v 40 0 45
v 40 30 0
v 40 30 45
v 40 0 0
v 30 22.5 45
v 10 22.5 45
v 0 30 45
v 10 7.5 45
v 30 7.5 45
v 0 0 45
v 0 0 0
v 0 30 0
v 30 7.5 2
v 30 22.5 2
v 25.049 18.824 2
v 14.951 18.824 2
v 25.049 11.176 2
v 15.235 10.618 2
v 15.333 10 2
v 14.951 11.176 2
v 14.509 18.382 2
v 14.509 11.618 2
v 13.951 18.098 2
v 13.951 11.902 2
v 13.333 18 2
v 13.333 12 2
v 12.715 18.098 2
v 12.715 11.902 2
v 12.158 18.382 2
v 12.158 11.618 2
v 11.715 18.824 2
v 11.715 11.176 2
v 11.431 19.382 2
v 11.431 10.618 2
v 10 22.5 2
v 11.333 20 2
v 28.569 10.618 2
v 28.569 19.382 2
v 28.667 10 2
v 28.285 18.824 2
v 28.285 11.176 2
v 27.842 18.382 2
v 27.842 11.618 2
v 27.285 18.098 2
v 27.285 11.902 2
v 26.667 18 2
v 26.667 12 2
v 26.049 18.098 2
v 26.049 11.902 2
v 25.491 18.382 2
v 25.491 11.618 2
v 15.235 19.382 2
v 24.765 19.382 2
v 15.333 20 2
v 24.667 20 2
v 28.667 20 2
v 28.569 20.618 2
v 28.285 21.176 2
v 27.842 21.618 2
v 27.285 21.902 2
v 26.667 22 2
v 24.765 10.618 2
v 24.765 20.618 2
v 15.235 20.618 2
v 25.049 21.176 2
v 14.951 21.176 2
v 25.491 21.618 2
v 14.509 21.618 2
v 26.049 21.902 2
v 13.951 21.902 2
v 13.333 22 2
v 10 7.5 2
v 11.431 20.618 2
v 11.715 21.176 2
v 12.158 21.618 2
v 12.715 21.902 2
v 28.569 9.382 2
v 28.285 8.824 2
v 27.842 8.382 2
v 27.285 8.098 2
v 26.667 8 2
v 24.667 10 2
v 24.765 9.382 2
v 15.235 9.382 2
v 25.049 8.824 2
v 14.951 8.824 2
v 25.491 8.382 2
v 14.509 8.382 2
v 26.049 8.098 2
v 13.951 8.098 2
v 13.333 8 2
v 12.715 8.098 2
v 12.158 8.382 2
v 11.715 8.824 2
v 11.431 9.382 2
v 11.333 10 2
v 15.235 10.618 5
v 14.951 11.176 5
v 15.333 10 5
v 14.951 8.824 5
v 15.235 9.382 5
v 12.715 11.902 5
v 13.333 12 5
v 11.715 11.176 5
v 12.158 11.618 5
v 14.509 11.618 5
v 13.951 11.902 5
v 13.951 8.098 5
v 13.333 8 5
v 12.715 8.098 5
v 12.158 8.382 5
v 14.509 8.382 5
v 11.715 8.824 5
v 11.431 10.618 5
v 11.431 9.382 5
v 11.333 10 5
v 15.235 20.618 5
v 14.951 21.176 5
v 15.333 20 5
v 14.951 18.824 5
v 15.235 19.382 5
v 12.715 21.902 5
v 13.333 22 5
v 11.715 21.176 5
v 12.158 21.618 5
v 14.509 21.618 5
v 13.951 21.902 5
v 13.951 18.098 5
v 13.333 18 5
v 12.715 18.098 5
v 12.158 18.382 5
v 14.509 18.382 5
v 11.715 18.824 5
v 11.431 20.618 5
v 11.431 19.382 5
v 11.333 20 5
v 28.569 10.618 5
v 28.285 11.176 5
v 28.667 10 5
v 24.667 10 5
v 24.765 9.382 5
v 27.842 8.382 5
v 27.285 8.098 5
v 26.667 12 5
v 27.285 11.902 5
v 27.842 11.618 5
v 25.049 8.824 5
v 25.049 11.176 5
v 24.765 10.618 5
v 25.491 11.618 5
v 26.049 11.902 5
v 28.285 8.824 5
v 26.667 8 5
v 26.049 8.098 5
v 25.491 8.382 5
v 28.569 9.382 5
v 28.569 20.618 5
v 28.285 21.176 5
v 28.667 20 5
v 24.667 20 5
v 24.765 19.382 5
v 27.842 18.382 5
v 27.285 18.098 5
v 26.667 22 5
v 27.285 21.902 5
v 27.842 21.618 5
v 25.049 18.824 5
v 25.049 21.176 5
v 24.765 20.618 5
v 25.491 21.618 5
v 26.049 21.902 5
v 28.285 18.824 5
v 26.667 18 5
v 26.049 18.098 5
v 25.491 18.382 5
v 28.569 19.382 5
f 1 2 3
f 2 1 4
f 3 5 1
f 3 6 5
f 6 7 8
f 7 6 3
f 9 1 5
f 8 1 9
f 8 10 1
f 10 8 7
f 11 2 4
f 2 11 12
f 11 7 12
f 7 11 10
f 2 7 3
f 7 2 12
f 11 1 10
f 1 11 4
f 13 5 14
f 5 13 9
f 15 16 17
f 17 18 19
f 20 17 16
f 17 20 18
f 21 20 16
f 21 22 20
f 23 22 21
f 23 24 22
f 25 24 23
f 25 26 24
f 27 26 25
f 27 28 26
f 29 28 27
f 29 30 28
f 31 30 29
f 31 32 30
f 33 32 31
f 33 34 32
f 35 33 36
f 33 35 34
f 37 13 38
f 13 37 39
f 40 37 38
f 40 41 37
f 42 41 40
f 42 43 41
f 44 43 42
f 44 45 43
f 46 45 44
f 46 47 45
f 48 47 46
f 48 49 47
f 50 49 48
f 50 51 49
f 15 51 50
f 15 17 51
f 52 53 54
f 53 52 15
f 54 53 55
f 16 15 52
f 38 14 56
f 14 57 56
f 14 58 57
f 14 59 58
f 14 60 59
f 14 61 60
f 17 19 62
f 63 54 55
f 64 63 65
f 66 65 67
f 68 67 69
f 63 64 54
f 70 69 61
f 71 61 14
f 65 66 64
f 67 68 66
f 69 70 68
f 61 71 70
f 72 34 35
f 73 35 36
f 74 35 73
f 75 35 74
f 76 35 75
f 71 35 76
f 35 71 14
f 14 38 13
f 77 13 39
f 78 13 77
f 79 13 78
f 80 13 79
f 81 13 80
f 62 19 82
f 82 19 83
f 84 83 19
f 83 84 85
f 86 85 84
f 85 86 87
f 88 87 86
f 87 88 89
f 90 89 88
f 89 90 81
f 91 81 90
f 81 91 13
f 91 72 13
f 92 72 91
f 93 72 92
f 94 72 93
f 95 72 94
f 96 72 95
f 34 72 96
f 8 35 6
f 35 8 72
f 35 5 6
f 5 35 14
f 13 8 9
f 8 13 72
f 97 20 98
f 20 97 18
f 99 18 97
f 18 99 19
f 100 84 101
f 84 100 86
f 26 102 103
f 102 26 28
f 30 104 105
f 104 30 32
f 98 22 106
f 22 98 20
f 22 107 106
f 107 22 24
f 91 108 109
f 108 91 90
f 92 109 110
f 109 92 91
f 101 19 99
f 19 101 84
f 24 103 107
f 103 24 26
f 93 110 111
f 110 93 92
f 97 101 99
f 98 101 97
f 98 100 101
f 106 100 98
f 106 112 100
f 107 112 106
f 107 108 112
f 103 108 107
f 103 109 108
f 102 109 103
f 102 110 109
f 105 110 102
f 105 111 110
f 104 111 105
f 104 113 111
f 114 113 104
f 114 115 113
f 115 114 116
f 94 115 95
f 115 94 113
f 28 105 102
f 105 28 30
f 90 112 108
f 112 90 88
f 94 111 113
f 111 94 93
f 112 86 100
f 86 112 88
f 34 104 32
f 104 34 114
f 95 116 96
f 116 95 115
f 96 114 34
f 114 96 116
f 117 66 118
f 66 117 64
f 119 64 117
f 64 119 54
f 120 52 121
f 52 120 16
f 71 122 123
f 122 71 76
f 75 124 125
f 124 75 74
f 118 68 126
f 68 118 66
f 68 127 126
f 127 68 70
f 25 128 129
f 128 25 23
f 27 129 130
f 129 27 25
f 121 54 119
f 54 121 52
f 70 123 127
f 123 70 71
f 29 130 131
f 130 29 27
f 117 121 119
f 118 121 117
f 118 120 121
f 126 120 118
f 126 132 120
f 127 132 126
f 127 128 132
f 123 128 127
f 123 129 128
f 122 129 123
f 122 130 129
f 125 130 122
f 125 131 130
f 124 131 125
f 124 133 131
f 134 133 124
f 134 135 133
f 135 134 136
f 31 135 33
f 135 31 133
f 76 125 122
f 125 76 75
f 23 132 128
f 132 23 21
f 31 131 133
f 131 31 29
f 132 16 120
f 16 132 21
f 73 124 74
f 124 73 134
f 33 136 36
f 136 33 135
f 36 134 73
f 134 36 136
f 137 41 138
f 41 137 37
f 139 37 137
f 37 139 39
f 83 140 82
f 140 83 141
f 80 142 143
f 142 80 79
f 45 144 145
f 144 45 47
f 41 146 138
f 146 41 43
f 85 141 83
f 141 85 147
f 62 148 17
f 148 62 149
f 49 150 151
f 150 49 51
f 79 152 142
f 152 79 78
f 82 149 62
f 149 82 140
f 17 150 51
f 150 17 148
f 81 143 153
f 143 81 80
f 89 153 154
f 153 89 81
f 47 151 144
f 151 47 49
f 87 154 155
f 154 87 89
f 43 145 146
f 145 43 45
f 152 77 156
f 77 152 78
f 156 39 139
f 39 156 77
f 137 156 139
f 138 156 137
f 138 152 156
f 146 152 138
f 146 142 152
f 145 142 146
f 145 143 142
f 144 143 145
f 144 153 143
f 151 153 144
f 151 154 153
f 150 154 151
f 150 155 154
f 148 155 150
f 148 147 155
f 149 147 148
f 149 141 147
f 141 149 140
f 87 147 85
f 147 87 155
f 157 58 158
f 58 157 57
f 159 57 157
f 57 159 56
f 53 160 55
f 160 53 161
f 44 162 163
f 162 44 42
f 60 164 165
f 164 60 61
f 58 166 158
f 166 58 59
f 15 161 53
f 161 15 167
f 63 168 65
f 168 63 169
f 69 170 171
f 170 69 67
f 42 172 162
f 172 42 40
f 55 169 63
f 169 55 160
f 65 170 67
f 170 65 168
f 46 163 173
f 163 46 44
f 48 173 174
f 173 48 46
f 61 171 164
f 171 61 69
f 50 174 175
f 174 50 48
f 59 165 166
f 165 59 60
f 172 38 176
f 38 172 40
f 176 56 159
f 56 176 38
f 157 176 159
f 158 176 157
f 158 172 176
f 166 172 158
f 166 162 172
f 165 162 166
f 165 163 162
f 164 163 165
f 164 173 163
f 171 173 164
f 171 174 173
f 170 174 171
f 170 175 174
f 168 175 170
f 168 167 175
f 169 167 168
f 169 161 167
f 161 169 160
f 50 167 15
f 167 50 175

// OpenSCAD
/* 
 * Wrench Holder Generator
 * Holds wrenches in various sizes
 * Compatible with toolgrid-generator.scad peg hole pattern
 */

/* [Display Mode] */
print_mode = "single"; // [single, multi_row]

/* [Grid Integration] */
hole_center_spacing = 9.5; // [8:12]
pin_hole_diameter = 4.2; // [3:8]

/* [Wrench Size] */
wrench_size = "large"; // [small, large]
width_offset = 0; // [-5:5] - Fine-tune width

/* [Housing Dimensions] */
housing_width = 40; // [25:55]
housing_height = 30; // [20:45]
housing_depth = 45; // [30:70]

/* [Pin Configuration] */
pin_diameter = 4.0; // [3:6]
num_pins_x = 2; // [1:4]
num_pins_y = 2; // [1:4]

/* [Rotation] */
holder_rotation = 0; // [0:360]

/* [Wall Thickness] */
wall_thickness = 3; // [2:5]
floor_thickness = 2; // [1:4]

/* [Advanced] */
pin_offset_from_edge = 3; // [1:8]
fillet_radius = 1; // [0:3]

// ===== CALCULATED PARAMETERS =====
final_width = housing_width + width_offset;
pin_spacing_x = final_width / (num_pins_x + 1);
pin_spacing_y = housing_height / (num_pins_y + 1);

// ===== MAIN MODULES =====

module holder_base() {
    difference() {
        cube([final_width, housing_height, housing_depth]);
        
        translate([
            (final_width - 20) / 2,
            (housing_height - 15) / 2,
            floor_thickness
        ]) {
            cube([20, 15, housing_depth]);
        }
        
        for (x = [1:num_pins_x]) {
            for (y = [1:num_pins_y]) {
                pin_x = x * pin_spacing_x;
                pin_y = y * pin_spacing_y;
                translate([pin_x, pin_y, pin_offset_from_edge]) {
                    cylinder(d=pin_diameter, h=housing_depth, $fn=20);
                }
            }
        }
    }
    
    for (x = [1:num_pins_x]) {
        for (y = [1:num_pins_y]) {
            pin_x = x * pin_spacing_x;
            pin_y = y * pin_spacing_y;
            translate([pin_x, pin_y, 0]) {
                cylinder(d=pin_diameter, h=pin_offset_from_edge + pin_diameter/2, $fn=20);
            }
        }
    }
}

module mounting_pegs() {
    peg_diameter = pin_hole_diameter - 0.2;
    peg_height = 5;
    
    translate([pin_diameter/2 + wall_thickness, housing_height/2, 0]) {
        cylinder(d=peg_diameter, h=peg_height, $fn=20);
    }
    translate([final_width - wall_thickness - pin_diameter/2, housing_height/2, 0]) {
        cylinder(d=peg_diameter, h=peg_height, $fn=20);
    }
}

module complete_holder() {
    translate([final_width/2, housing_height/2, 0]) {
        rotate([0, 0, holder_rotation]) {
            translate([-final_width/2, -housing_height/2, 0]) {
                holder_base();
            }
        }
    }
    mounting_pegs();
}

// ===== GENERATION =====

if (print_mode == "single") {
    complete_holder();
} else if (print_mode == "multi_row") {
    spacing = hole_center_spacing * 2.5;
    for (i = [0:3]) {
        translate([i * spacing, 0, 0]) {
            complete_holder();
        }
    }
}

// ===== DEBUG OUTPUT =====
echo("=== Wrench Holder Generator ===");
echo("Size: ", wrench_size);
echo("Housing: ", final_width, "×", housing_height, "×", housing_depth, "mm");
echo("Support pins: ", num_pins_x, "×", num_pins_y);
echo("Rotation: ", holder_rotation, "°");
